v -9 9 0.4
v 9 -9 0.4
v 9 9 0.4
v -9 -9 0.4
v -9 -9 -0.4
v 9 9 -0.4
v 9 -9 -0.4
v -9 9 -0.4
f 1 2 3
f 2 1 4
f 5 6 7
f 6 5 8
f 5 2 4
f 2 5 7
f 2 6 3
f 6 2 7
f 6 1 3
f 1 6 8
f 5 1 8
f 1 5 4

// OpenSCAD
$fn=64;

module pcb(size_x=18.0, size_y=18.0, thickness=0.8) {
    cube([size_x, size_y, thickness], center=true);
}

pcb();
